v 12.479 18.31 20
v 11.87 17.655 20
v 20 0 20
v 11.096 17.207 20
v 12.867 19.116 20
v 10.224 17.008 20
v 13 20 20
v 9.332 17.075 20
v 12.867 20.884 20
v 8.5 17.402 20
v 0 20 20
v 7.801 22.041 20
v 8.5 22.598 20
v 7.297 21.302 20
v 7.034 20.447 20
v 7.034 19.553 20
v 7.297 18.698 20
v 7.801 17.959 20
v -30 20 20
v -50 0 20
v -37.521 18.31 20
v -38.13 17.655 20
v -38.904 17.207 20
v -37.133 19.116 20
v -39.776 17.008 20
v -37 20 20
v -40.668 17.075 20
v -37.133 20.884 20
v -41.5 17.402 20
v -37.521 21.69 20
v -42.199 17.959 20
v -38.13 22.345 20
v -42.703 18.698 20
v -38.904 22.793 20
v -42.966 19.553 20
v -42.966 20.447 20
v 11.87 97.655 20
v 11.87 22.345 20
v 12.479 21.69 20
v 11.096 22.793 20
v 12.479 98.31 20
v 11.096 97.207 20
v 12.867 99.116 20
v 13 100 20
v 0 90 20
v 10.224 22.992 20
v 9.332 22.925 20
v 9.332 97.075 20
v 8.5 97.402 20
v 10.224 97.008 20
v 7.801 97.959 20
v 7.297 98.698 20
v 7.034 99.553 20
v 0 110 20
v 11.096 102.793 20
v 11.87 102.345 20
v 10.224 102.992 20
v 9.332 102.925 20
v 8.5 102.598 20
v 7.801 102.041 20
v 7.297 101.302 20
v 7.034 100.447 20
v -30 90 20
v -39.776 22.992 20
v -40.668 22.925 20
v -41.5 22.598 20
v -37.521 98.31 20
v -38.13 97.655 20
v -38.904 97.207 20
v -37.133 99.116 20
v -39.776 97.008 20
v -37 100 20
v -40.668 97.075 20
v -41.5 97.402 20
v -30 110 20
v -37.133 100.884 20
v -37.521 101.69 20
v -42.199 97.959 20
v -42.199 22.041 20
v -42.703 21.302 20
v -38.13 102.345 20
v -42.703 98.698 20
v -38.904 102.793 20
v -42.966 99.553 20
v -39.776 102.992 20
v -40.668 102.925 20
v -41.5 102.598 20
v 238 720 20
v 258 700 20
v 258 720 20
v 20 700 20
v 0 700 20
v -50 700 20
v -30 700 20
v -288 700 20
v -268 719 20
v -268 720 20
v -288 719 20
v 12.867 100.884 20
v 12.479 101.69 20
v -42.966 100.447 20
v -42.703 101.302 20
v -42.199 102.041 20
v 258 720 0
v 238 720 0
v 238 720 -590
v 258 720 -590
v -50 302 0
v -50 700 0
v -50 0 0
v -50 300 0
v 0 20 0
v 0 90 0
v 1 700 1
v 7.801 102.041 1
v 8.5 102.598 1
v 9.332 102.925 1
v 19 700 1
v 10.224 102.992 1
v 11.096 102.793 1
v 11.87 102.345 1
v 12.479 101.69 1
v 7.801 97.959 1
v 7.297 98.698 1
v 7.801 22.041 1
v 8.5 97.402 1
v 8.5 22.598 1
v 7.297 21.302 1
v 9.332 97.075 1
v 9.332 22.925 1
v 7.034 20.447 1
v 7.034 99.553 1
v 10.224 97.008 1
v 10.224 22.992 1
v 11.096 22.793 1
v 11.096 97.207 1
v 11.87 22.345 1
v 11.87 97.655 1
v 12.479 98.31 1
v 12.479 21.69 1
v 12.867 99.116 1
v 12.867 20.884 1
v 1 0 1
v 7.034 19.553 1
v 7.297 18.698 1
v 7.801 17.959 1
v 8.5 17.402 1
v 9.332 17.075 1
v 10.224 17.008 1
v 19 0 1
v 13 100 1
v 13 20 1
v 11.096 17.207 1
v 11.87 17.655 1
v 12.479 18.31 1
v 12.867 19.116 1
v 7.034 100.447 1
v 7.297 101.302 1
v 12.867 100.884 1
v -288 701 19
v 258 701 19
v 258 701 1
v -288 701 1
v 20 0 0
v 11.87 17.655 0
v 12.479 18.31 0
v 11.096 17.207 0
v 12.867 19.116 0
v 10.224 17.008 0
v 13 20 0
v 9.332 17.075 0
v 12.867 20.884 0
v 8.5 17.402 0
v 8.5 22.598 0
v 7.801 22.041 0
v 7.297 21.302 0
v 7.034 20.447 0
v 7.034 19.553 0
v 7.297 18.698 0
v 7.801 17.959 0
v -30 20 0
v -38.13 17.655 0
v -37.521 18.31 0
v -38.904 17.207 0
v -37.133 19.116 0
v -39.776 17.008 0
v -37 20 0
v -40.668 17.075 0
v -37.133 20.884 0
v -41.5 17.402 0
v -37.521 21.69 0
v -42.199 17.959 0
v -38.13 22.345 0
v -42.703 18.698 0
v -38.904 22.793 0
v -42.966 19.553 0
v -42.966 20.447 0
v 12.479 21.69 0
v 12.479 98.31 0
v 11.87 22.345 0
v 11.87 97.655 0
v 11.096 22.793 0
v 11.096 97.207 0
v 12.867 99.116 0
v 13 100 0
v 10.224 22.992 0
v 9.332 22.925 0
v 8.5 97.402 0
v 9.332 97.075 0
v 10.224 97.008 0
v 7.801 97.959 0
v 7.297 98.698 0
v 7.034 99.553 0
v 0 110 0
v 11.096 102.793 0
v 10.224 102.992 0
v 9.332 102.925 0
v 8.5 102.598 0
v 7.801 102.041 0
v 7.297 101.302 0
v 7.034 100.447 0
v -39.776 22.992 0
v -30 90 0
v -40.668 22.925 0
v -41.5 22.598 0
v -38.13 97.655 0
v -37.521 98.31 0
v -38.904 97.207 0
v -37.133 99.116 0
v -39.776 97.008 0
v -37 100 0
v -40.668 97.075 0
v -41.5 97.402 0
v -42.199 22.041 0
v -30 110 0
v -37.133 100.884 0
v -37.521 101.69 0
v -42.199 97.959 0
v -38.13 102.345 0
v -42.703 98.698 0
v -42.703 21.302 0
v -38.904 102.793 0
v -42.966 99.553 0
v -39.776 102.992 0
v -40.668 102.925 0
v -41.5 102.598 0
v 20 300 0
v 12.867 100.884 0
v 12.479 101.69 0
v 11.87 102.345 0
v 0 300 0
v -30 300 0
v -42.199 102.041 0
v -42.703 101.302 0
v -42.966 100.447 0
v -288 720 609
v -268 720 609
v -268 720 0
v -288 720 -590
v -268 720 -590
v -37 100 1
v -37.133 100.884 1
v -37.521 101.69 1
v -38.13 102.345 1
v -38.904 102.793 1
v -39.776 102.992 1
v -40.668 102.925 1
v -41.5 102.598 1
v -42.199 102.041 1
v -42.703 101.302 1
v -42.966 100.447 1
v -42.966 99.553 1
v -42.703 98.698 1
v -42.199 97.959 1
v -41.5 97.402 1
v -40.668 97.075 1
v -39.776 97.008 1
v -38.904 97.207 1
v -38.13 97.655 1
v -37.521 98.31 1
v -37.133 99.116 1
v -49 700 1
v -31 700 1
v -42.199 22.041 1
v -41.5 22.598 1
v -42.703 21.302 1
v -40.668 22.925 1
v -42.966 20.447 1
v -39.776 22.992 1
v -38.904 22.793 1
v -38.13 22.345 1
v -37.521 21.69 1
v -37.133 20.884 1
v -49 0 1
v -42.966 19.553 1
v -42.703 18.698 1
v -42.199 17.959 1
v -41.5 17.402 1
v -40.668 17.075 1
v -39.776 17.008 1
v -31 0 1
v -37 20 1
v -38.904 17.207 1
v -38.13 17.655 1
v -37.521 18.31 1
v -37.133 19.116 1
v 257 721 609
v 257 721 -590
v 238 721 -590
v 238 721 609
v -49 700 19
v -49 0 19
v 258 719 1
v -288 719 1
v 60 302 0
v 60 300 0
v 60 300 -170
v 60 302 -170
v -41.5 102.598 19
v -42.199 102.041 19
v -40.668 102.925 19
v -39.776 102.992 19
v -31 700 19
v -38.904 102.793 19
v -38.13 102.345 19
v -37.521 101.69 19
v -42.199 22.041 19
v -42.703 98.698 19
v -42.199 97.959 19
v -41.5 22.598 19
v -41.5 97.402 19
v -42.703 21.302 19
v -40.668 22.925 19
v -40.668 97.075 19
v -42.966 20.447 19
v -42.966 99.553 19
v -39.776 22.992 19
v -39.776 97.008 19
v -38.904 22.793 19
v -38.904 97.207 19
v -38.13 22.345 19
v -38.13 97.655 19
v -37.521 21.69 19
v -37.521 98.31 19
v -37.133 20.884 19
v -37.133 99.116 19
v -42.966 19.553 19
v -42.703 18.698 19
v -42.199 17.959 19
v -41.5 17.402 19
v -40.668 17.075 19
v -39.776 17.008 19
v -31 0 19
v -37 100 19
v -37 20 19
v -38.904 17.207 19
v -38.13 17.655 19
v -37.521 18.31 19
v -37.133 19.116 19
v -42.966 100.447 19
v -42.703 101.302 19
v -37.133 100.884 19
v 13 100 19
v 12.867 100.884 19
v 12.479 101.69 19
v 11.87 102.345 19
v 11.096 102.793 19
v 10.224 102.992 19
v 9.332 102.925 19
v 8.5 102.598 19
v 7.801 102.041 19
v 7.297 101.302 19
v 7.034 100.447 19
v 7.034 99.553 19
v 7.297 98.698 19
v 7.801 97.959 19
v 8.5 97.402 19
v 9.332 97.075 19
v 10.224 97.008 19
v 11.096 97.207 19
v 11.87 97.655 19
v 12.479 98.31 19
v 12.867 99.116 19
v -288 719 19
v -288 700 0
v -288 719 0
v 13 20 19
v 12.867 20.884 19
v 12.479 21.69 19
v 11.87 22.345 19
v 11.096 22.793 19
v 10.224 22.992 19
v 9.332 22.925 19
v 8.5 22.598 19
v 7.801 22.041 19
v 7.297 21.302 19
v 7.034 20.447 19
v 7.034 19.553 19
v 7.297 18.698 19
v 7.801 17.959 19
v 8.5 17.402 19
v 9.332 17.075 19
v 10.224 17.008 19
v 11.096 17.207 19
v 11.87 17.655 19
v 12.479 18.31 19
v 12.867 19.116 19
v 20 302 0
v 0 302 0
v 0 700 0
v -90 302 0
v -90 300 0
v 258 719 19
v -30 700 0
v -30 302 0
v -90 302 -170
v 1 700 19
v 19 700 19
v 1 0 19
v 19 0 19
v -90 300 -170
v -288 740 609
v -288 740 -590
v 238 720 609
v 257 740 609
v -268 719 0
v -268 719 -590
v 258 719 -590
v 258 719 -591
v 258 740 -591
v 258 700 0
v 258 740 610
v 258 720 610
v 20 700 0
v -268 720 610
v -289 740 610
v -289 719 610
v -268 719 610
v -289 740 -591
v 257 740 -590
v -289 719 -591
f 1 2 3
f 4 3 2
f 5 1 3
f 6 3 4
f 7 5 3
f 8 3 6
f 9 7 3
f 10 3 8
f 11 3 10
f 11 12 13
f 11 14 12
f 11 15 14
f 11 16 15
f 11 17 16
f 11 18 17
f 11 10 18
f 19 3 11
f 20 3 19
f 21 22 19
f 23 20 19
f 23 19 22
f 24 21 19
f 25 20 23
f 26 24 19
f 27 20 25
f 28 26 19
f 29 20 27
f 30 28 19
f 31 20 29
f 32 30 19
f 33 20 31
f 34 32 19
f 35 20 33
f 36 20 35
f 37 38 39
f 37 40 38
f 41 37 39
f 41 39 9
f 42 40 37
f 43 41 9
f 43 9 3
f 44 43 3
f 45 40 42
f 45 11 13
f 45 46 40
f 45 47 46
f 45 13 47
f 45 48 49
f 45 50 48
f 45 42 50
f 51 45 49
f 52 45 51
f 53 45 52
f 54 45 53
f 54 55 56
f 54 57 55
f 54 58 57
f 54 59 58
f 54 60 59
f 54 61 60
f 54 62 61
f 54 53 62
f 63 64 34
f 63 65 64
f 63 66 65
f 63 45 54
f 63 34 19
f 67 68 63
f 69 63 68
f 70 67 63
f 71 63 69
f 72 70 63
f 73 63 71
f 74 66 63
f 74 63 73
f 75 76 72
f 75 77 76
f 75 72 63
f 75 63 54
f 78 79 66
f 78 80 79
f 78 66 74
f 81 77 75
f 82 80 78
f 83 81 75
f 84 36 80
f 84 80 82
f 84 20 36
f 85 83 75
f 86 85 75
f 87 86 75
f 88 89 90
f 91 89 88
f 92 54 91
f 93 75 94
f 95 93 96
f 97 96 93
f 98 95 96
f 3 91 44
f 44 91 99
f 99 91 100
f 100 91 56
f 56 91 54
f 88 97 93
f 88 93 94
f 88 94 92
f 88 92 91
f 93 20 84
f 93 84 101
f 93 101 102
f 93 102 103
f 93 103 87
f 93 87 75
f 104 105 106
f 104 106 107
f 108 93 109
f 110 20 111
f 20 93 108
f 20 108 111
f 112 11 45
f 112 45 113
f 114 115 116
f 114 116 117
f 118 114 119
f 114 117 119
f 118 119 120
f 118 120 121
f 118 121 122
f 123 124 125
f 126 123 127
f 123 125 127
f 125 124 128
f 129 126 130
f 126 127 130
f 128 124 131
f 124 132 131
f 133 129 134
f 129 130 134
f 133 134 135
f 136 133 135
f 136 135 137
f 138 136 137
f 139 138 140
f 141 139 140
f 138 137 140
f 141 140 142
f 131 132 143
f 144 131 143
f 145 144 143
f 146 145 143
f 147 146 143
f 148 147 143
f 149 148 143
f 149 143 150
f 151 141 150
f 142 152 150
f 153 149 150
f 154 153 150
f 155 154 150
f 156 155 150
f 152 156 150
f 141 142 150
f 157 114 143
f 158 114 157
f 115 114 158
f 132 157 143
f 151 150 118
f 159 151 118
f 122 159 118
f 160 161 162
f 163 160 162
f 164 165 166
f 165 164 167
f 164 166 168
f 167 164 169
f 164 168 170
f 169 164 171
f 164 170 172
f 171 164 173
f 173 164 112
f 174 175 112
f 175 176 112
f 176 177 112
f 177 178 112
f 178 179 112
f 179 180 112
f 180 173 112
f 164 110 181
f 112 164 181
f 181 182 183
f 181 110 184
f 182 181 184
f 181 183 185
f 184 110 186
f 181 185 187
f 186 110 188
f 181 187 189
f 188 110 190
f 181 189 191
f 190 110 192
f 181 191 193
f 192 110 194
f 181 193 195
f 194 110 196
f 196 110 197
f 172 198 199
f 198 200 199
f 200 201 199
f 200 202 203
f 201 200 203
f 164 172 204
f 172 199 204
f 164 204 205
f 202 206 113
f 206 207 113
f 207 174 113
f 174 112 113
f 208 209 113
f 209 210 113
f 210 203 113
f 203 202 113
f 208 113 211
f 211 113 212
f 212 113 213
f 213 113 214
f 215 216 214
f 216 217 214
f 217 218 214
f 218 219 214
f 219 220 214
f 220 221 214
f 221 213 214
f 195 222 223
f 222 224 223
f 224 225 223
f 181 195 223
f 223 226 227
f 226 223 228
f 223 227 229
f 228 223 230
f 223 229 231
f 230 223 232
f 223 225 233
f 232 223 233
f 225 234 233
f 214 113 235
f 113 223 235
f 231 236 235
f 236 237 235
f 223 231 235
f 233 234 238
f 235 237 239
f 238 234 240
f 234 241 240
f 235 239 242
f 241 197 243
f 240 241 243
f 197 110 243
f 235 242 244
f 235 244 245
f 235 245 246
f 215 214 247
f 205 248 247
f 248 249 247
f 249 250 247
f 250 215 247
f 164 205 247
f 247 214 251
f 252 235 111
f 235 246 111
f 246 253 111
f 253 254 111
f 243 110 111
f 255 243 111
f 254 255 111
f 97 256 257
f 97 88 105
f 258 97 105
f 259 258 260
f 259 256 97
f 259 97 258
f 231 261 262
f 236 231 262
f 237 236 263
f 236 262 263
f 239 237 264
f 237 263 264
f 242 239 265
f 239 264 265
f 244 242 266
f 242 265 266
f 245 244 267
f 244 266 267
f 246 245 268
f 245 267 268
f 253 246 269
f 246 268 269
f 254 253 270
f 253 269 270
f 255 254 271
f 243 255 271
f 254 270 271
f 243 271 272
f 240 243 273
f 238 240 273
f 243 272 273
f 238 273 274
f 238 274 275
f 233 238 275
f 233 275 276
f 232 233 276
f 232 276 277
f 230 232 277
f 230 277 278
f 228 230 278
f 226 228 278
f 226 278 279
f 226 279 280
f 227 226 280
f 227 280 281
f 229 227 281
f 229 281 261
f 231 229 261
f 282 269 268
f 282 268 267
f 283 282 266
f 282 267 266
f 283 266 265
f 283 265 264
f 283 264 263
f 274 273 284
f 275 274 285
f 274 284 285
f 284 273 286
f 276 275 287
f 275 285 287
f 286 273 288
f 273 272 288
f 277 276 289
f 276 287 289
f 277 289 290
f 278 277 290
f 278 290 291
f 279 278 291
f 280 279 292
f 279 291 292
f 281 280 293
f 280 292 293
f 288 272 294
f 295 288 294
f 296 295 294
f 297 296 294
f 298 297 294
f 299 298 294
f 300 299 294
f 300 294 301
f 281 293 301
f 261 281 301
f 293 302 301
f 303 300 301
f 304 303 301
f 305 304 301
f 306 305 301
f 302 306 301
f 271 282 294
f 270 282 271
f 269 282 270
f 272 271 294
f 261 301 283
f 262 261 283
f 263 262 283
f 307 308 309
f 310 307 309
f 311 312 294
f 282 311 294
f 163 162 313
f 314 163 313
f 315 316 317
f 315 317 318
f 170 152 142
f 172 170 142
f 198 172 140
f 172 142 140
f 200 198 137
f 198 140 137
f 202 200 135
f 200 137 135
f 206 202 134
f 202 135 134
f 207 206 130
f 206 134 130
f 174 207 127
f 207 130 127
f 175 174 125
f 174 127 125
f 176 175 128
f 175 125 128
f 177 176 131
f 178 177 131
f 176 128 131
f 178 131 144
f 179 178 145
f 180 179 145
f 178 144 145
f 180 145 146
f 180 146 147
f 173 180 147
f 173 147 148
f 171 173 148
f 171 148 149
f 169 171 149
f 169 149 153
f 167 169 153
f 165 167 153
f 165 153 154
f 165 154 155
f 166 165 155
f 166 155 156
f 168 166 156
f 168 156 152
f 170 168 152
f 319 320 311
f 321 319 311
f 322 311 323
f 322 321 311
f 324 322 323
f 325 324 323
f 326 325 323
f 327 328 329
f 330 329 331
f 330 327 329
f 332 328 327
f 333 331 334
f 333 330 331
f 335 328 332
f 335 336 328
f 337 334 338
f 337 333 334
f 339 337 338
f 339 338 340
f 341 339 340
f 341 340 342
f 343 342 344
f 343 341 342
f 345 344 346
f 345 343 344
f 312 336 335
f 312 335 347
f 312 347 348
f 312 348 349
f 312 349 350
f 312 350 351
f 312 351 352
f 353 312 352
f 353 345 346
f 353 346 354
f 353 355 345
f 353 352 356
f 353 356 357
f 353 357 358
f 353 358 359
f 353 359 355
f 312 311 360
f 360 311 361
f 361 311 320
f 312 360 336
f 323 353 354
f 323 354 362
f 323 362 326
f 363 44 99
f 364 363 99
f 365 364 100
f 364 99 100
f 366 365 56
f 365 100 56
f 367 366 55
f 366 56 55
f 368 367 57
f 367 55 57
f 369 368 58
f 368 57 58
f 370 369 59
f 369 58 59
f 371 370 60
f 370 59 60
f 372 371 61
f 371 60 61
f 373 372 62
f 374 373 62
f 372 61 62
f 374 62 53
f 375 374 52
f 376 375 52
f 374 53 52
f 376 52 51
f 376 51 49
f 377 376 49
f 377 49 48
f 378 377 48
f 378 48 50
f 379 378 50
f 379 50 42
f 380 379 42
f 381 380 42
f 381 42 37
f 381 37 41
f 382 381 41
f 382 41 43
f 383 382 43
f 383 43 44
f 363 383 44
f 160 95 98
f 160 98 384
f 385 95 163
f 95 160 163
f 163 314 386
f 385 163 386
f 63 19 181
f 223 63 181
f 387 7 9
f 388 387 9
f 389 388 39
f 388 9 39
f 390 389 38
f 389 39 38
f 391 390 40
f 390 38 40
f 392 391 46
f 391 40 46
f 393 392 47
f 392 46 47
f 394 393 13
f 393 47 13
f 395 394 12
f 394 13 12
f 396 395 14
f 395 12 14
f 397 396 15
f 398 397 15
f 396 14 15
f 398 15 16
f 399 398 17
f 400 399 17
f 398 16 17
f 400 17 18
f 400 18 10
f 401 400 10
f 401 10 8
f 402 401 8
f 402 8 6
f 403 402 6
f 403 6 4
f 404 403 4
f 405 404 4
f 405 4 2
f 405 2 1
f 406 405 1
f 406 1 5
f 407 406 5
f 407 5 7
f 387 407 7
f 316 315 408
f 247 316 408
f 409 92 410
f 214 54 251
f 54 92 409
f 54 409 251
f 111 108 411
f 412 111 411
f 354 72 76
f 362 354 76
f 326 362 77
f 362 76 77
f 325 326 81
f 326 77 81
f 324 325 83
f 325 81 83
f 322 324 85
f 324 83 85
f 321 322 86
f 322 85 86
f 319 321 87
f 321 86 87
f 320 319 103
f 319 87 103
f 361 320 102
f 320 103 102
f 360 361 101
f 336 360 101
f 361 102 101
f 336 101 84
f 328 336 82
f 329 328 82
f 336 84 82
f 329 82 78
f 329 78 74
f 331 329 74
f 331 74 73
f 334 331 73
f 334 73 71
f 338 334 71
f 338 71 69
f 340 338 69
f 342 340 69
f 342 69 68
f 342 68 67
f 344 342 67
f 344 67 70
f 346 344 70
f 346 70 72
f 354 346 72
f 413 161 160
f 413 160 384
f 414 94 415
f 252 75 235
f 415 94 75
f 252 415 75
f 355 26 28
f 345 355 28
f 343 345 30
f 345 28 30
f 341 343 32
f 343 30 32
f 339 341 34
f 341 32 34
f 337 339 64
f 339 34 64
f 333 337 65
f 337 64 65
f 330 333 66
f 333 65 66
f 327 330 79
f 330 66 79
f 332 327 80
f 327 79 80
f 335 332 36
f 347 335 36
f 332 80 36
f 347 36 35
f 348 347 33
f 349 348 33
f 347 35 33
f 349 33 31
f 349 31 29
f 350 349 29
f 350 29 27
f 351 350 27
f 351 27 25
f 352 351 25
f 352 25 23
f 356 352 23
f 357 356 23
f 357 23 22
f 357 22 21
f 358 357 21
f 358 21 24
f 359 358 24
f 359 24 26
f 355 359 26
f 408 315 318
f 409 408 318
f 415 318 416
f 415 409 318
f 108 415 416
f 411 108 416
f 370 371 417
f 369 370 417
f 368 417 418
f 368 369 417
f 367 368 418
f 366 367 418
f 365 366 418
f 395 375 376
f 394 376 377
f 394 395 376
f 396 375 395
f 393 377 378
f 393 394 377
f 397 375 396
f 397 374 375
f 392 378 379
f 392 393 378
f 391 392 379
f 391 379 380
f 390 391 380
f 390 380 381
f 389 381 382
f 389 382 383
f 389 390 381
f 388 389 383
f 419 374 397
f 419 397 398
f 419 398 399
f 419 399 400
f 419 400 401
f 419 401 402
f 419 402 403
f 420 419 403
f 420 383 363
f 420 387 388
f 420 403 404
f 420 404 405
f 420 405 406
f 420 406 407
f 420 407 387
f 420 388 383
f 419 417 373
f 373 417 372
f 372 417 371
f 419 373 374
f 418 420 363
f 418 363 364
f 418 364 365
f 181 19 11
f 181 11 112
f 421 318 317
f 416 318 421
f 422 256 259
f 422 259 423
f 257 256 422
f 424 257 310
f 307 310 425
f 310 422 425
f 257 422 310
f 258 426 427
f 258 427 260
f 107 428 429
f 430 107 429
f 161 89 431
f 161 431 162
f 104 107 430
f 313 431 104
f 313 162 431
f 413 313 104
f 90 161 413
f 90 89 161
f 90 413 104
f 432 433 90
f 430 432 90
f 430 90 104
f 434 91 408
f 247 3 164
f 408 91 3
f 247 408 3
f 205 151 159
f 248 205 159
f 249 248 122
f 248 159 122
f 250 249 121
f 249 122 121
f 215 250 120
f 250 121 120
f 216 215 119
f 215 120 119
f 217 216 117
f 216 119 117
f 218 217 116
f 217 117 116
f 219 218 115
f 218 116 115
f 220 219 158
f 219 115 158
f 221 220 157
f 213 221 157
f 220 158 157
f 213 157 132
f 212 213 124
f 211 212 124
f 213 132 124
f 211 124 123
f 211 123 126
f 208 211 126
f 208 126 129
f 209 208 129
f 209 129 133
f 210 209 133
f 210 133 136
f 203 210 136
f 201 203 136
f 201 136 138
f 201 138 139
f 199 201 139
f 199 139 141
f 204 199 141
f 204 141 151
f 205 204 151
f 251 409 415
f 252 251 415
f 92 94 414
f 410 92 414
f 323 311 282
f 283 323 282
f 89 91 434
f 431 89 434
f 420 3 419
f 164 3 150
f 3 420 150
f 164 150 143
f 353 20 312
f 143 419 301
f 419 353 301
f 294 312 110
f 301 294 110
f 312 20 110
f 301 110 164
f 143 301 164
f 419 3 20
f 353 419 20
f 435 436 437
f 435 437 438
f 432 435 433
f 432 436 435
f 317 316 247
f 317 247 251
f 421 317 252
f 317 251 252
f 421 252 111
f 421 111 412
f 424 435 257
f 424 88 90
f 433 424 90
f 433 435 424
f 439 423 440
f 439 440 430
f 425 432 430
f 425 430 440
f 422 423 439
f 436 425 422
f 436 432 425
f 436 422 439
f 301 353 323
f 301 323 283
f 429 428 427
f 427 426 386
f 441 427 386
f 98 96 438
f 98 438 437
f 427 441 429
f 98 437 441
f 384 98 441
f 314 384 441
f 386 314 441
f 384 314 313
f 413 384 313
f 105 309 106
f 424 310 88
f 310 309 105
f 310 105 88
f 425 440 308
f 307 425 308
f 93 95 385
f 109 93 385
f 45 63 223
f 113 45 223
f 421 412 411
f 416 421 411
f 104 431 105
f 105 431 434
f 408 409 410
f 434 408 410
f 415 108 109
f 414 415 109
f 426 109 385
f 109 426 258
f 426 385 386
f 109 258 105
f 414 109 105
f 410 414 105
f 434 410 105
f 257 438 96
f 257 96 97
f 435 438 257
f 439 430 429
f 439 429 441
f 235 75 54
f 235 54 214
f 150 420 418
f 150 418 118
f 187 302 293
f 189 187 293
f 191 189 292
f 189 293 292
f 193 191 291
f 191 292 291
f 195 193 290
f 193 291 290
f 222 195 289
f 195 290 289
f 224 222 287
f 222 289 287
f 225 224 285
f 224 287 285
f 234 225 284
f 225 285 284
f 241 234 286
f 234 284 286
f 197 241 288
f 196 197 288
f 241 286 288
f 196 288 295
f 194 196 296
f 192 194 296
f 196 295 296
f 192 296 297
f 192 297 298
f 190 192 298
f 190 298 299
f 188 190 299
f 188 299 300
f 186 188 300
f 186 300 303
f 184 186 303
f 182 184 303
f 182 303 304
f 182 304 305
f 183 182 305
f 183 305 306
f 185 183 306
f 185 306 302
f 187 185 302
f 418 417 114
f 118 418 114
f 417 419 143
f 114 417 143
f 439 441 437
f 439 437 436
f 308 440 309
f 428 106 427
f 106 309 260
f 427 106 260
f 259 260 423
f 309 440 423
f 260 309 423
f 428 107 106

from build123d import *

# Parameters (mm, degrees)
SKETCH1_W                = 20
SKETCH1_H                = 20
SKETCH1_W_2              = 18
SKETCH1_H_2              = 18
EXTRUDE_THIN1_DEPTH      = 700
EXTRUDE_THIN1_2_DEPTH    = 700
EXTRUDE_THIN2_DEPTH      = 238
EXTRUDE_THIN2_DEPTH_BACK = 308
SKETCH3_W                = 20
SKETCH3_H                = 20
SKETCH3_W_2              = 18
SKETCH3_H_2              = 18
F_6_0MM_DOWEL_HOLE1_D    = 6
EXTRUDE_THIN3_DEPTH      = 590
EXTRUDE_THIN3_DEPTH_BACK = 610
SKETCH8_W                = 547
SKETCH8_H                = 21
BOSS_EXTRUDE1_DEPTH      = 1
SKETCH9_W                = 547
SKETCH9_H                = 20
BOSS_EXTRUDE4_DEPTH      = 1
SKETCH10_W               = 20
SKETCH10_H               = 20
BOSS_EXTRUDE5_DEPTH      = 30
SKETCH11_W               = 150
SKETCH11_H               = 2
BOSS_EXTRUDE6_DEPTH      = 170


with BuildPart() as part:
    # Sketch1 → Extrude-Thin1 (new body)
    with BuildSketch(Plane(origin=(0, 0, 0), x_dir=(1, 0, 0), z_dir=(0, 1, 0))):
        with Locations((10, -10)):
            Rectangle(SKETCH1_W, SKETCH1_H)
        with Locations((10, -10)):
            Rectangle(SKETCH1_W_2, SKETCH1_H_2, mode=Mode.SUBTRACT)
    extrude(amount=EXTRUDE_THIN1_DEPTH)



with BuildPart() as body_2:
    # Sketch1 → Extrude-Thin1 2 (new body)
    with BuildSketch(Plane(origin=(0, 0, 0), x_dir=(1, 0, 0), z_dir=(0, 1, 0))):
        with Locations((-40, -10)):
            Rectangle(SKETCH1_W, SKETCH1_H)
        with Locations((-40, -10)):
            Rectangle(SKETCH1_W_2, SKETCH1_H_2, mode=Mode.SUBTRACT)
    extrude(amount=EXTRUDE_THIN1_2_DEPTH)


with BuildPart() as part_1:
    add(part.part)

    add(body_2.part)  # Extrude-Thin2 merges body 2
    # Sketch3 → Extrude-Thin2 (add, two sides: drawn at the far end of the back side and taken through both)
    with BuildSketch(Plane(origin=(20, 0, 0), x_dir=(0, 0, -1), z_dir=(1, 0, 0)).offset(-EXTRUDE_THIN2_DEPTH_BACK)):
        with Locations((-10, 710)):
            Rectangle(SKETCH3_W, SKETCH3_H)
        with Locations((-10, 710)):
            Rectangle(SKETCH3_W_2, SKETCH3_H_2, mode=Mode.SUBTRACT)
    extrude(amount=EXTRUDE_THIN2_DEPTH + EXTRUDE_THIN2_DEPTH_BACK)

    # Ø6.0mm Dowel Hole1 (through all)
    with Locations(Plane(origin=(0, 0, 0), x_dir=(-1, 0, 0), z_dir=(0, 0, -1))):
        with Locations((40, 20), (-10, 20), (-10, 100), (40, 100)):
            Hole(F_6_0MM_DOWEL_HOLE1_D / 2)

    # Sketch6 → Extrude-Thin3 (add, two sides: drawn at the far end of the back side and taken through both)
    with BuildSketch(Plane(origin=(0, 0, 0), x_dir=(-1, 0, 0), z_dir=(0, 0, -1)).offset(-EXTRUDE_THIN3_DEPTH_BACK)):
        Polygon((-238, 720), (-258, 720), (-258, 740), (-257, 740), (-257, 721), (-238, 721), align=None)
        Polygon((268, 720), (288, 720), (288, 740), (289, 740), (289, 719), (268, 719), align=None)
    extrude(amount=EXTRUDE_THIN3_DEPTH + EXTRUDE_THIN3_DEPTH_BACK)

    # Sketch8 → Boss-Extrude1 (add)
    with BuildSketch(Plane(origin=(0, 0, -590), x_dir=(-1, 0, 0), z_dir=(0, 0, -1))):
        with Locations((15.5, 729.5)):
            Rectangle(SKETCH8_W, SKETCH8_H)
    extrude(amount=BOSS_EXTRUDE1_DEPTH)

    # Sketch9 → Boss-Extrude4 (add)
    with BuildSketch(Plane.XY.offset(610)):
        with Locations((-15.5, 730)):
            Rectangle(SKETCH9_W, SKETCH9_H)
    extrude(amount=-BOSS_EXTRUDE4_DEPTH)

    # Sketch10 → Boss-Extrude5 (add)
    with BuildSketch(Plane(origin=(-30, 0, 0), x_dir=(0, 0, -1), z_dir=(1, 0, 0))):
        with Locations((-10, 10)):
            Rectangle(SKETCH10_W, SKETCH10_H)
        with Locations((-10, 100)):
            Rectangle(SKETCH10_W, SKETCH10_H)
    extrude(amount=BOSS_EXTRUDE5_DEPTH)

    # Sketch11 → Boss-Extrude6 (add)
    with BuildSketch(Plane(origin=(0, 0, 0), x_dir=(-1, 0, 0), z_dir=(0, 0, -1))):
        with Locations((15, 301)):
            Rectangle(SKETCH11_W, SKETCH11_H)
    extrude(amount=BOSS_EXTRUDE6_DEPTH)


solid = part_1.part
